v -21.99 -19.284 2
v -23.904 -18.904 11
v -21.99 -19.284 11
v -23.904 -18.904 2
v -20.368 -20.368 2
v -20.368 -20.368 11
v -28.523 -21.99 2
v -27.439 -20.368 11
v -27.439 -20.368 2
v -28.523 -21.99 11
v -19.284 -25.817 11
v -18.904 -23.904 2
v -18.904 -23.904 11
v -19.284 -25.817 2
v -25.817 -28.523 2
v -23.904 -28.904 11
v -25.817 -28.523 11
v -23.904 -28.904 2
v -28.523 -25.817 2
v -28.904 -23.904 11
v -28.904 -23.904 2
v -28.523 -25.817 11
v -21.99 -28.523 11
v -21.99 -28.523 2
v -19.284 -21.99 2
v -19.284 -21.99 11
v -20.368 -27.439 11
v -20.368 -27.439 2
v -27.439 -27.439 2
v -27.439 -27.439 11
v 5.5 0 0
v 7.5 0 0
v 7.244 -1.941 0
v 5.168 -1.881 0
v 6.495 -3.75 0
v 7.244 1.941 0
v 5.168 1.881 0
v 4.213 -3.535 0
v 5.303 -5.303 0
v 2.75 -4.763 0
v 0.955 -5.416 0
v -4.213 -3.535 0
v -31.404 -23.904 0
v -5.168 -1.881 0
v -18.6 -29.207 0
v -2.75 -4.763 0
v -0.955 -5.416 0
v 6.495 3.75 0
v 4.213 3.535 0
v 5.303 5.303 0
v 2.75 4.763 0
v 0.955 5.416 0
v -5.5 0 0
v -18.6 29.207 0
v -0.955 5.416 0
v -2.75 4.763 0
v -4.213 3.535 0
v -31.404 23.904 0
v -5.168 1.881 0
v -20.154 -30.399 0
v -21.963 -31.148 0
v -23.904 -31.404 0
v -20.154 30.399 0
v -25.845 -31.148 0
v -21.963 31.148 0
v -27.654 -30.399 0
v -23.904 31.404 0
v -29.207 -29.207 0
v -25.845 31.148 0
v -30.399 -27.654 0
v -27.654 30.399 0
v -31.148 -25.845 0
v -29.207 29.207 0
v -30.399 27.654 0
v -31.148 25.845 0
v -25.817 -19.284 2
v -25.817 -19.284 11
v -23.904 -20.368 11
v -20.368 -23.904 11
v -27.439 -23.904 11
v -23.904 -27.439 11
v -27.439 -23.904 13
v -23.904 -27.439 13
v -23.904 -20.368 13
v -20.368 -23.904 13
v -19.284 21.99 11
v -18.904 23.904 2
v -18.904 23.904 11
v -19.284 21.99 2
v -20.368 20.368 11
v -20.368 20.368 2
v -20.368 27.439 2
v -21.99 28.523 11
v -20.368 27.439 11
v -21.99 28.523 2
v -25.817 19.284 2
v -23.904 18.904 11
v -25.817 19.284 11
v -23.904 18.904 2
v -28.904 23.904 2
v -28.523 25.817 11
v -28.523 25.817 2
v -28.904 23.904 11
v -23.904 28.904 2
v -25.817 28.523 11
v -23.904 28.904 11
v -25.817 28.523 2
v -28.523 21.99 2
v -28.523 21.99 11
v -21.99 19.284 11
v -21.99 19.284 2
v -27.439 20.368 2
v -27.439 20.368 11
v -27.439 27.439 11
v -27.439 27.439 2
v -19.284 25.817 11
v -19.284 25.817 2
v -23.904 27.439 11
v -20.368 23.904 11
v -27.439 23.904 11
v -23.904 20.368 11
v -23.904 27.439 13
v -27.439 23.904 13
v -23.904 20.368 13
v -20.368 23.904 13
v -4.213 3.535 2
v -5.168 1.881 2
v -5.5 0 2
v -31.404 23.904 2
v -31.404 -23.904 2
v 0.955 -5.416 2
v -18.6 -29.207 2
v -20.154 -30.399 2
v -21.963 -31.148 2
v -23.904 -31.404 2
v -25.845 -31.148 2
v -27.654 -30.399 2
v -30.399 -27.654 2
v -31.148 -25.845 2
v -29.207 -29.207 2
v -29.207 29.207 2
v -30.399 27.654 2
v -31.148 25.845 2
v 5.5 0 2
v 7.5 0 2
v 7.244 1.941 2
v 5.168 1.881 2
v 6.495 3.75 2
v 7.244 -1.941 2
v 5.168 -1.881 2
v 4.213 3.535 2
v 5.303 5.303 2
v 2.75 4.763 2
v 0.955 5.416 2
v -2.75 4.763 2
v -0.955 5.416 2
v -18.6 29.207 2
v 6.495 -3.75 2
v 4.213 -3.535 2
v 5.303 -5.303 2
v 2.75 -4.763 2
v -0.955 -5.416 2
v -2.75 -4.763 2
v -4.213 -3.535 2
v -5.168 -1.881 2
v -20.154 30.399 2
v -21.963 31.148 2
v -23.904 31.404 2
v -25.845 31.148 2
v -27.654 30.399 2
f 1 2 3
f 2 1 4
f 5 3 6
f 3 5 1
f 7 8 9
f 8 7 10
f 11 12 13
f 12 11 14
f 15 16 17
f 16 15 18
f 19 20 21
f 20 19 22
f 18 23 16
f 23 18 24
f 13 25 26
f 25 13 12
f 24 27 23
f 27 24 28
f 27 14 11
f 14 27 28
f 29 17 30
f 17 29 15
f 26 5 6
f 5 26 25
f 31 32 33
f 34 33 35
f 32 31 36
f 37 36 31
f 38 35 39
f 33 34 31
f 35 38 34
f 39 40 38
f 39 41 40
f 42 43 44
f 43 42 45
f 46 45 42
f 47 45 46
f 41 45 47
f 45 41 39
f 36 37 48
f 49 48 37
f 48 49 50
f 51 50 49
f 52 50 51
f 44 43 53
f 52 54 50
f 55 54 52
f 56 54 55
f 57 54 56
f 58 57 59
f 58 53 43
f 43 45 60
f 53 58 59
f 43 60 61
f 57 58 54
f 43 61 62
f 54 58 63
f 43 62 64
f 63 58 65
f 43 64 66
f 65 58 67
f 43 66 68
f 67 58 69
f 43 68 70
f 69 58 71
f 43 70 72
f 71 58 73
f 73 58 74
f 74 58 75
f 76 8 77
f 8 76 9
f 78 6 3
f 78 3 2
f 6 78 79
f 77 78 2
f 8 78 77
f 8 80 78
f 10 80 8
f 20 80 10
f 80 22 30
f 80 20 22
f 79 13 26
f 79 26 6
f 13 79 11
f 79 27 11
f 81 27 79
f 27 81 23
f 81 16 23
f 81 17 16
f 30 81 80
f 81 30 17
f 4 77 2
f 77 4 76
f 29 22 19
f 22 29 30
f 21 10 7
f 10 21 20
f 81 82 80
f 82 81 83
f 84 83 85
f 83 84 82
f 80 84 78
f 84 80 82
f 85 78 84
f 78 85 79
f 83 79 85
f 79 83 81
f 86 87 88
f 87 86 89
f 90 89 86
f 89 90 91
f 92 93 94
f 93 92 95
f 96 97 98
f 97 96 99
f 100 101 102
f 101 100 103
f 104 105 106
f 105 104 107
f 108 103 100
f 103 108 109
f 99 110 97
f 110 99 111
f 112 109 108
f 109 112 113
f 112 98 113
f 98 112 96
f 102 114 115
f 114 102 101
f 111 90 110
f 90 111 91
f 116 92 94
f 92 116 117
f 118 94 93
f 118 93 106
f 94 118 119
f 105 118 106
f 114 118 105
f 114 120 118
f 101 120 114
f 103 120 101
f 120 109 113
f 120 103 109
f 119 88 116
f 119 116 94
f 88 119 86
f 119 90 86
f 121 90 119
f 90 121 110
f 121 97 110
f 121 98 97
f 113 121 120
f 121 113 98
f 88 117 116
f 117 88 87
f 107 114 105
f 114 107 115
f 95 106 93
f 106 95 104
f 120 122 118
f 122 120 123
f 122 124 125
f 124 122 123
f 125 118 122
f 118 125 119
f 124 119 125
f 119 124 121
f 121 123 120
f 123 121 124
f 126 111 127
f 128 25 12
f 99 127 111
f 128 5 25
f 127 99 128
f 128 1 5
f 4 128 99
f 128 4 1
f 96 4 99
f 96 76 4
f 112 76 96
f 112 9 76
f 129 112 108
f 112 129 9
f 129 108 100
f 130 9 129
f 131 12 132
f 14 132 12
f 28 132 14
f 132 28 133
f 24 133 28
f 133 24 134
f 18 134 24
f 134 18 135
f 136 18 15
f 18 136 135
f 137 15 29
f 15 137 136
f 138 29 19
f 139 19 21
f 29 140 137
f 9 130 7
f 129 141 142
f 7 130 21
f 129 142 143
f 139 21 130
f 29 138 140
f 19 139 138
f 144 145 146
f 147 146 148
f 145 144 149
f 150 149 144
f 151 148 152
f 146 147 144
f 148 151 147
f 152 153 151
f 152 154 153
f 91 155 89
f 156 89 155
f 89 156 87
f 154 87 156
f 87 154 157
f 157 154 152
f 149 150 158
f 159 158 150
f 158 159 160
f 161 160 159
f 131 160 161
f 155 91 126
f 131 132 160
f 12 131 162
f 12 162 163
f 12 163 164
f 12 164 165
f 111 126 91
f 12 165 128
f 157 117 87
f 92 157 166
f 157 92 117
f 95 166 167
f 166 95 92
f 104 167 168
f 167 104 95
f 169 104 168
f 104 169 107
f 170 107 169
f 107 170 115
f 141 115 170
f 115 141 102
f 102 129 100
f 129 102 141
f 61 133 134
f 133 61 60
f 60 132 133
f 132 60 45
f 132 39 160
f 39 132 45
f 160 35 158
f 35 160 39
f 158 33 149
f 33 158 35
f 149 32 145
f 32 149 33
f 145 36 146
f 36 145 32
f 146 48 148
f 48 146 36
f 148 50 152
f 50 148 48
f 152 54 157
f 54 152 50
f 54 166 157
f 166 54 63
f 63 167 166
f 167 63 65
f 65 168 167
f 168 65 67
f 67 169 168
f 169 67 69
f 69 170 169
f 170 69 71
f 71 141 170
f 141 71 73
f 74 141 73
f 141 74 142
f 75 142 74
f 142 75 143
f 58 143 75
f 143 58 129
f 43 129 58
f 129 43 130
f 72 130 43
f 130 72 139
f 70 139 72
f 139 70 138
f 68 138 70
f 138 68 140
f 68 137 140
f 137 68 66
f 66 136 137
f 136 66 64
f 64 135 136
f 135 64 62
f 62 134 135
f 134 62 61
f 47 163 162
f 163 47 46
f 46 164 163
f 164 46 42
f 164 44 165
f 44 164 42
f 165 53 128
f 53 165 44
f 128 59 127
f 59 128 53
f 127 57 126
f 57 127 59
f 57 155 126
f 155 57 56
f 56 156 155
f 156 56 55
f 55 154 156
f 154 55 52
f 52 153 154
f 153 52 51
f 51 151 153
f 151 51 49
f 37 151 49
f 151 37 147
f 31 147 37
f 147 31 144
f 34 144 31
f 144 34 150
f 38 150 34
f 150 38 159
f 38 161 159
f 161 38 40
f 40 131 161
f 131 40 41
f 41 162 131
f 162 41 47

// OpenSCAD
// file: varicap.scad
capacitance = 400; // pF
num_plates = 11;
plate_gap = 5;
plate_thickness = 2;

strut_r = 5;
handle_length = 25;
leg_length = 10;
leg_separation_angle=90;

fit_gap = 0.5;
slip_gap = 1;

num_stators = floor(num_plates/2);
num_rotors = ceil(num_plates/2);
leg_angle_0 = leg_separation_angle/2;
leg_angle_1 = 360 - leg_separation_angle/2;
r = sqrt((2*plate_gap*capacitance) / ((num_plates-1)*0.2248*3.14));
//TODO: account for space missing in the centre of the plates

module semicircle () {
    difference() {
        circle(r);
        circle(strut_r-fit_gap);
        translate([r,0,0]) {
            square(2*r, true);
        }
    }
}

module washer() {
    difference() {
        circle(strut_r);
        circle(bolt_r);
    }
}

module spacer(end) {
    
    washer_len = plate_thickness + plate_gap - slip_gap/2;
    bearing_len = end ? plate_thickness*2 + plate_gap + slip_gap/2 : plate_thickness+plate_gap;
    
    difference () {
        union () {
            if (end) {
                linear_extrude (washer_len) {
                    circle (strut_r * 1.5);
                }
            }
            linear_extrude (bearing_len) {
                circle (strut_r);
            }
            translate ([0,0,bearing_len - fit_gap]) {
                linear_extrude(plate_thickness+fit_gap) {
                    square (strut_r, true);
                }
            }
        }
        
        translate ([0,0,-fit_gap]) {
            linear_extrude (plate_thickness + fit_gap*2) {
                square (strut_r+fit_gap, true);
            }
        }
    }
}
// main file
include <varicap.scad>;

end_position=0;

module endstand (end) {
    union () {
        linear_extrude (plate_thickness) {
            difference () {
                hull () {
                    circle (1.5 * strut_r);
                    fixing_point (1.5 * strut_r, leg_angle_0);
                    fixing_point (1.5 * strut_r, leg_angle_1);
                }
                circle (strut_r+slip_gap/2);
                fixing_point (strut_r-fit_gap, leg_angle_0);
                fixing_point (strut_r-fit_gap, leg_angle_1);
            }
        }
        
        end_spacer (leg_angle_0, end);
        end_spacer (leg_angle_1, end);
    }
}

module end_spacer(angle, end) {
    length = end ? plate_thickness + (plate_gap + slip_gap/2) - (plate_gap - plate_thickness)/2  : plate_thickness + (plate_gap*2 + slip_gap/2) - (plate_gap - plate_thickness)/2;
    rotate([0,0,angle]) {
        translate([-(r + leg_length),0,0]) {
            if (end == 0) {
                union () {
                    linear_extrude (length) {
                        circle(strut_r);
                    }
                    translate ([0,0,length-fit_gap]) {
                        linear_extrude(plate_thickness + fit_gap) {
                            square(strut_r, true);
                        }
                    }
                }
            }
            else {
               difference () {
                    linear_extrude (length) {
                        circle(strut_r);
                    }
                    translate ([0,0,length-plate_thickness-fit_gap]) {
                        linear_extrude(plate_thickness + fit_gap*2) {
                            square(strut_r+fit_gap, true);
                        }
                    }
                }
            }
        }
    }
}

module fixing_point(diameter, angle) {
    rotate([0,0,angle]) 
        translate([-(r + leg_length),0,0]) 
            circle(diameter);
}

endstand (end_position);
